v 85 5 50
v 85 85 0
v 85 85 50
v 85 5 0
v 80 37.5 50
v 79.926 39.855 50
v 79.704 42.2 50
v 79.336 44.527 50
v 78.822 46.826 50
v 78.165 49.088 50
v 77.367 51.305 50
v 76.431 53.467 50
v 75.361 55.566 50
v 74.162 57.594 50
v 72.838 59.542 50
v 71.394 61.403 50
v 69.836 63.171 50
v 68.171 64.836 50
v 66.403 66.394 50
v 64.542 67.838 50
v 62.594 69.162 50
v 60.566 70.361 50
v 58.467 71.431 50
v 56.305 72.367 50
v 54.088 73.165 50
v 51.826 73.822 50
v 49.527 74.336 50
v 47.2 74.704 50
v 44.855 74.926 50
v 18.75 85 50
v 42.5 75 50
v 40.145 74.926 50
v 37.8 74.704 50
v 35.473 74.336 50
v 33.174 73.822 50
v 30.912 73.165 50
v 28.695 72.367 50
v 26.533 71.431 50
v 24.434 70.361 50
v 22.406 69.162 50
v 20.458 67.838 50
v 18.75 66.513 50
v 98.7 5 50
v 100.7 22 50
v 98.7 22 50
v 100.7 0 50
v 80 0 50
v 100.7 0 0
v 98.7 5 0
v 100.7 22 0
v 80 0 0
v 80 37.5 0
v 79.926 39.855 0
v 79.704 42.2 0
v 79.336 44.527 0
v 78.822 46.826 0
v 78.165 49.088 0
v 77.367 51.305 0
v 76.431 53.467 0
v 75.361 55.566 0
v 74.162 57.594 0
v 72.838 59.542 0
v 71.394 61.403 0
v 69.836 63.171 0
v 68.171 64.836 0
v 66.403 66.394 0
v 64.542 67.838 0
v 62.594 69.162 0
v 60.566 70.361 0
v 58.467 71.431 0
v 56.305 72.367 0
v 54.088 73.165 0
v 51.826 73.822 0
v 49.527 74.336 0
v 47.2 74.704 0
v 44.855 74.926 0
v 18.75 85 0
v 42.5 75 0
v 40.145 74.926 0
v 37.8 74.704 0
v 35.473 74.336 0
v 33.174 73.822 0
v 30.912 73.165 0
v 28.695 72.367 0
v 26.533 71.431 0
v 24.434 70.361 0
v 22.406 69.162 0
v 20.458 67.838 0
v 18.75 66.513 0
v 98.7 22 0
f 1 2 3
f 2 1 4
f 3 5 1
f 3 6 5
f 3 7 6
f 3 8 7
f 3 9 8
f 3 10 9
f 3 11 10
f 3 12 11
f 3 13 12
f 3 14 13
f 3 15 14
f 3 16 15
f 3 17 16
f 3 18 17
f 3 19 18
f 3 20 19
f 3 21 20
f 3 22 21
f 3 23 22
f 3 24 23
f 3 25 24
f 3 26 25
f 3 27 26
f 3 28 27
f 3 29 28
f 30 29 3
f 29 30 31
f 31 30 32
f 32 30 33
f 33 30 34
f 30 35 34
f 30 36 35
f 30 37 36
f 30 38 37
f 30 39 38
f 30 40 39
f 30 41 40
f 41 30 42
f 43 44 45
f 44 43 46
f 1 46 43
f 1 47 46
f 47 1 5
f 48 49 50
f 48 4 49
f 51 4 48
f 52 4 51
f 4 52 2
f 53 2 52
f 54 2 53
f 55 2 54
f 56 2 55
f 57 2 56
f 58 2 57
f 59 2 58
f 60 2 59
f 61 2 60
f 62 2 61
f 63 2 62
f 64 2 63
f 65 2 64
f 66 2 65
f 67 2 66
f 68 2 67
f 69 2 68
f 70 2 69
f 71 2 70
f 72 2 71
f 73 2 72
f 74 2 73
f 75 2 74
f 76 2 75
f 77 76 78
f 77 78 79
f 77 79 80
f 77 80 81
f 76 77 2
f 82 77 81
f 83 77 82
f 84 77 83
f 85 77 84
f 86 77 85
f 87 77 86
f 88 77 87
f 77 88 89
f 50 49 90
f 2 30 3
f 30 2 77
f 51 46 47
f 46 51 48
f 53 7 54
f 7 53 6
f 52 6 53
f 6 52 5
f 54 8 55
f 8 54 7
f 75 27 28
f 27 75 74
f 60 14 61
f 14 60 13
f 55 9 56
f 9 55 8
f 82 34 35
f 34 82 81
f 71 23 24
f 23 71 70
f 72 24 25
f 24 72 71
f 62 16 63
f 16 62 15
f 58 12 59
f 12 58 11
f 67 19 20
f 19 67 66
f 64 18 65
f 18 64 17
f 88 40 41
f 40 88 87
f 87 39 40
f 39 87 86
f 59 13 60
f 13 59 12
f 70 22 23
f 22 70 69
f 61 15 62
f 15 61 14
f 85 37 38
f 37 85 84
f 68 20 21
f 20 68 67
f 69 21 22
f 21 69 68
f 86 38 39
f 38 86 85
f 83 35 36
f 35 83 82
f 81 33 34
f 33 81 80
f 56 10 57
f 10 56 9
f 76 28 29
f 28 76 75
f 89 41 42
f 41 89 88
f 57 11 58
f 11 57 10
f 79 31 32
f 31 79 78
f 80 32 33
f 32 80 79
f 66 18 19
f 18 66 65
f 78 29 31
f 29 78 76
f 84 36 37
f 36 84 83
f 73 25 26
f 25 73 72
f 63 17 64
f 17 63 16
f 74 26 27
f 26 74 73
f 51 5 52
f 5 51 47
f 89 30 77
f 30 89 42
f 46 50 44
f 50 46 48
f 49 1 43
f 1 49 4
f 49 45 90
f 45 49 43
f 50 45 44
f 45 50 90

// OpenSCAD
roll_diameter = 75;
roll_width = 50;
door_width = 13.7;
strength = 5;
inner_strength = 2;
inner_height = 12;

$fn=100;

difference(){
    cube([roll_diameter +2*strength , roll_diameter + 2*strength, roll_width]);
    
    translate([roll_diameter/2+strength, roll_diameter/2, -2*strength]) cylinder(r=roll_diameter/2, h=100);
    
    translate([-0.1,-0.1,-2*strength]) cube([roll_diameter/2+0.1, roll_diameter -2*strength+0.3, 100]);
    
    translate([-0.1,-0.1,-2*strength]) cube([roll_diameter+strength+0.1,roll_diameter/2+0.1,100]);
    
    translate([-0.1,roll_diameter-2*strength+0.1,-0.1]) cube([roll_diameter/4+0.1,5*strength+0.1,roll_width*2]);
}
translate([roll_diameter+2*strength,0,0]) cube([door_width + inner_strength, strength, roll_width]);

translate([roll_diameter+2*strength+door_width,strength,0]) 
cube([inner_strength, inner_height+strength, roll_width]);
